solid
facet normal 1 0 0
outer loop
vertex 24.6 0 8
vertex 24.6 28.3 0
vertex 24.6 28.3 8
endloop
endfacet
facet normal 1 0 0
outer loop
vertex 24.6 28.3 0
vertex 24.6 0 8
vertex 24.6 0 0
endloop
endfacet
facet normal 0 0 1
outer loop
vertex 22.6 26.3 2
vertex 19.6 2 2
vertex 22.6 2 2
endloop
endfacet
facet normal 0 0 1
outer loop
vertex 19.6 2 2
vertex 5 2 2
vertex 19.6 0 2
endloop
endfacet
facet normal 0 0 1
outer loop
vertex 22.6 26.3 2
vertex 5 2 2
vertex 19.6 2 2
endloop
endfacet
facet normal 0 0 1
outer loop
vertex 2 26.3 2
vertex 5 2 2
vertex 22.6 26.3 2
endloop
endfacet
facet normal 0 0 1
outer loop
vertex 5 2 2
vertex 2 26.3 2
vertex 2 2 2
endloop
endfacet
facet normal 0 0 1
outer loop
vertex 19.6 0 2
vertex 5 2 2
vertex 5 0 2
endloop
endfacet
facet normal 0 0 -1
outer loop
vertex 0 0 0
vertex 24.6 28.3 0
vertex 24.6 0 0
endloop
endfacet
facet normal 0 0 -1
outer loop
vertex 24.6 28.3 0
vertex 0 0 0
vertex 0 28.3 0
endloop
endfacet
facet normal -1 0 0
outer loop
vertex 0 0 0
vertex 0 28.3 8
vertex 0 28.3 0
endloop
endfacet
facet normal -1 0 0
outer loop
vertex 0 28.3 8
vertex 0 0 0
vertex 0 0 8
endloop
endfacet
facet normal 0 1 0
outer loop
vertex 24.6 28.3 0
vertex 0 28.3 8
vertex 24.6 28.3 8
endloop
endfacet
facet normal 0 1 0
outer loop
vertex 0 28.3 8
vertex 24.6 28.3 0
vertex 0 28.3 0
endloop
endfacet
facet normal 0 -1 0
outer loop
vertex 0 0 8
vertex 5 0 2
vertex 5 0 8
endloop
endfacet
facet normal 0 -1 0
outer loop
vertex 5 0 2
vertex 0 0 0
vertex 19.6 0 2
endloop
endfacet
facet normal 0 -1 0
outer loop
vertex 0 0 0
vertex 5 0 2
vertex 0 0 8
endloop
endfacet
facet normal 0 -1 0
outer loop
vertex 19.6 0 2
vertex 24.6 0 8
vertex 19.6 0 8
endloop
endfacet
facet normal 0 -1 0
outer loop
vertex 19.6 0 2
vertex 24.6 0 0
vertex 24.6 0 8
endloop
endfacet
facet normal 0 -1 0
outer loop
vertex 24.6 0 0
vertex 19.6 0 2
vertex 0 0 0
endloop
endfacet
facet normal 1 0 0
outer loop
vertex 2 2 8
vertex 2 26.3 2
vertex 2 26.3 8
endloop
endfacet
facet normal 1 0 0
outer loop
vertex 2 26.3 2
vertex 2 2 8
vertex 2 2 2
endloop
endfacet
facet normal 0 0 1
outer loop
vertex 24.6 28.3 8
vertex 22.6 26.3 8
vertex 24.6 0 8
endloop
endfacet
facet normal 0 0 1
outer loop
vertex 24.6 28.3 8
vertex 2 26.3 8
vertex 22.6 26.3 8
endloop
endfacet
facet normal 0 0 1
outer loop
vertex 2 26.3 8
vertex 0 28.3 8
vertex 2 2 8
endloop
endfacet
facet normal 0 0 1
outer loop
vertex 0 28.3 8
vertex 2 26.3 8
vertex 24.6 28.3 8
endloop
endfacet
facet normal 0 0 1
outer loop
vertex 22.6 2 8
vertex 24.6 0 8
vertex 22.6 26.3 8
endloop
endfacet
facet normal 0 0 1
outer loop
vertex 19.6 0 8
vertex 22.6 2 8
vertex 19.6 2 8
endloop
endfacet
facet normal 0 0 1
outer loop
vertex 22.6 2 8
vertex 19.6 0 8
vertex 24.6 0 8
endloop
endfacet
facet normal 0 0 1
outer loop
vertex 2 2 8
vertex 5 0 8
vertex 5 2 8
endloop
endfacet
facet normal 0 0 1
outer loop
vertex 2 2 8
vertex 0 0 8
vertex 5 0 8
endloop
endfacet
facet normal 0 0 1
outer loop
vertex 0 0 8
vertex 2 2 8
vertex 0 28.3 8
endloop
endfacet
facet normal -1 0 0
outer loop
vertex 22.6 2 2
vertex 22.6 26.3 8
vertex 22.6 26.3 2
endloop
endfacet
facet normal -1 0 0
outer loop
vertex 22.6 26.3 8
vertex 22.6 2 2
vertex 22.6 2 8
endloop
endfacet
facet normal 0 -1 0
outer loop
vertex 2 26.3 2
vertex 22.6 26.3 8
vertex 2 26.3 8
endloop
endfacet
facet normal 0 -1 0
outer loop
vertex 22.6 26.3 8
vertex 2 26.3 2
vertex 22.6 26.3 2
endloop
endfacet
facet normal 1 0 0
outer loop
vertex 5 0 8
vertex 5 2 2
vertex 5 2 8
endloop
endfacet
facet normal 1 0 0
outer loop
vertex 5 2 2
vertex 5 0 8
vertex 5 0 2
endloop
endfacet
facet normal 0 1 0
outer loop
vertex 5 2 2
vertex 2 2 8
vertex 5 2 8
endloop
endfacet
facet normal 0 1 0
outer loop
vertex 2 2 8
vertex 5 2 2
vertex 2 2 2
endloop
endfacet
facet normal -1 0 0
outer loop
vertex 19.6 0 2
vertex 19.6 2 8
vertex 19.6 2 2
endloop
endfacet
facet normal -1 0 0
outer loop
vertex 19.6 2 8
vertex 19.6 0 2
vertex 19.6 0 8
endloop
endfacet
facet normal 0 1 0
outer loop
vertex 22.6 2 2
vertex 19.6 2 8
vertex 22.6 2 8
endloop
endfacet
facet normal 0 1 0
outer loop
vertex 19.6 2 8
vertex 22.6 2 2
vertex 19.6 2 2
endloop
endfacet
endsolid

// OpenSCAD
// Open tray for the 20 mm x 26 mm ESP32-C3 board used by Rearview.
// The USB connector faces the centred opening at y = 0.

board_width = 20;
board_length = 26;

wall_thickness = 2;
base_thickness = 2;
wall_height = 6; // Height above the top of the base.
clearance = 0.3; // Clearance on each side and behind the board.
usb_end_wrap = 3; // Front wall overlap into the board opening on each side.

inner_width = board_width + (2 * clearance);
inner_length = board_length + clearance;
outer_width = inner_width + (2 * wall_thickness);
outer_length = inner_length + wall_thickness;

assert(wall_thickness > 0, "wall_thickness must be positive");
assert(base_thickness > 0, "base_thickness must be positive");
assert(wall_height > 0, "wall_height must be positive");
assert(clearance >= 0, "clearance cannot be negative");
assert(
  (2 * usb_end_wrap) < inner_width,
  "usb_end_wrap must leave a USB opening"
);

union() {
  // Base extends to the open USB edge.
  cube([outer_width, outer_length, base_thickness]);

  // Left and right walls.
  translate([0, 0, base_thickness])
    cube([wall_thickness, outer_length, wall_height]);
  translate([outer_width - wall_thickness, 0, base_thickness])
    cube([wall_thickness, outer_length, wall_height]);

  // Rear wall.
  translate([wall_thickness, outer_length - wall_thickness, base_thickness])
    cube([inner_width, wall_thickness, wall_height]);

  // Front corner walls wrap around the USB end by usb_end_wrap on each side.
  translate([0, 0, base_thickness])
    cube([wall_thickness + usb_end_wrap, wall_thickness, wall_height]);
  translate([
    outer_width - wall_thickness - usb_end_wrap,
    0,
    base_thickness,
  ])
    cube([wall_thickness + usb_end_wrap, wall_thickness, wall_height]);
}
